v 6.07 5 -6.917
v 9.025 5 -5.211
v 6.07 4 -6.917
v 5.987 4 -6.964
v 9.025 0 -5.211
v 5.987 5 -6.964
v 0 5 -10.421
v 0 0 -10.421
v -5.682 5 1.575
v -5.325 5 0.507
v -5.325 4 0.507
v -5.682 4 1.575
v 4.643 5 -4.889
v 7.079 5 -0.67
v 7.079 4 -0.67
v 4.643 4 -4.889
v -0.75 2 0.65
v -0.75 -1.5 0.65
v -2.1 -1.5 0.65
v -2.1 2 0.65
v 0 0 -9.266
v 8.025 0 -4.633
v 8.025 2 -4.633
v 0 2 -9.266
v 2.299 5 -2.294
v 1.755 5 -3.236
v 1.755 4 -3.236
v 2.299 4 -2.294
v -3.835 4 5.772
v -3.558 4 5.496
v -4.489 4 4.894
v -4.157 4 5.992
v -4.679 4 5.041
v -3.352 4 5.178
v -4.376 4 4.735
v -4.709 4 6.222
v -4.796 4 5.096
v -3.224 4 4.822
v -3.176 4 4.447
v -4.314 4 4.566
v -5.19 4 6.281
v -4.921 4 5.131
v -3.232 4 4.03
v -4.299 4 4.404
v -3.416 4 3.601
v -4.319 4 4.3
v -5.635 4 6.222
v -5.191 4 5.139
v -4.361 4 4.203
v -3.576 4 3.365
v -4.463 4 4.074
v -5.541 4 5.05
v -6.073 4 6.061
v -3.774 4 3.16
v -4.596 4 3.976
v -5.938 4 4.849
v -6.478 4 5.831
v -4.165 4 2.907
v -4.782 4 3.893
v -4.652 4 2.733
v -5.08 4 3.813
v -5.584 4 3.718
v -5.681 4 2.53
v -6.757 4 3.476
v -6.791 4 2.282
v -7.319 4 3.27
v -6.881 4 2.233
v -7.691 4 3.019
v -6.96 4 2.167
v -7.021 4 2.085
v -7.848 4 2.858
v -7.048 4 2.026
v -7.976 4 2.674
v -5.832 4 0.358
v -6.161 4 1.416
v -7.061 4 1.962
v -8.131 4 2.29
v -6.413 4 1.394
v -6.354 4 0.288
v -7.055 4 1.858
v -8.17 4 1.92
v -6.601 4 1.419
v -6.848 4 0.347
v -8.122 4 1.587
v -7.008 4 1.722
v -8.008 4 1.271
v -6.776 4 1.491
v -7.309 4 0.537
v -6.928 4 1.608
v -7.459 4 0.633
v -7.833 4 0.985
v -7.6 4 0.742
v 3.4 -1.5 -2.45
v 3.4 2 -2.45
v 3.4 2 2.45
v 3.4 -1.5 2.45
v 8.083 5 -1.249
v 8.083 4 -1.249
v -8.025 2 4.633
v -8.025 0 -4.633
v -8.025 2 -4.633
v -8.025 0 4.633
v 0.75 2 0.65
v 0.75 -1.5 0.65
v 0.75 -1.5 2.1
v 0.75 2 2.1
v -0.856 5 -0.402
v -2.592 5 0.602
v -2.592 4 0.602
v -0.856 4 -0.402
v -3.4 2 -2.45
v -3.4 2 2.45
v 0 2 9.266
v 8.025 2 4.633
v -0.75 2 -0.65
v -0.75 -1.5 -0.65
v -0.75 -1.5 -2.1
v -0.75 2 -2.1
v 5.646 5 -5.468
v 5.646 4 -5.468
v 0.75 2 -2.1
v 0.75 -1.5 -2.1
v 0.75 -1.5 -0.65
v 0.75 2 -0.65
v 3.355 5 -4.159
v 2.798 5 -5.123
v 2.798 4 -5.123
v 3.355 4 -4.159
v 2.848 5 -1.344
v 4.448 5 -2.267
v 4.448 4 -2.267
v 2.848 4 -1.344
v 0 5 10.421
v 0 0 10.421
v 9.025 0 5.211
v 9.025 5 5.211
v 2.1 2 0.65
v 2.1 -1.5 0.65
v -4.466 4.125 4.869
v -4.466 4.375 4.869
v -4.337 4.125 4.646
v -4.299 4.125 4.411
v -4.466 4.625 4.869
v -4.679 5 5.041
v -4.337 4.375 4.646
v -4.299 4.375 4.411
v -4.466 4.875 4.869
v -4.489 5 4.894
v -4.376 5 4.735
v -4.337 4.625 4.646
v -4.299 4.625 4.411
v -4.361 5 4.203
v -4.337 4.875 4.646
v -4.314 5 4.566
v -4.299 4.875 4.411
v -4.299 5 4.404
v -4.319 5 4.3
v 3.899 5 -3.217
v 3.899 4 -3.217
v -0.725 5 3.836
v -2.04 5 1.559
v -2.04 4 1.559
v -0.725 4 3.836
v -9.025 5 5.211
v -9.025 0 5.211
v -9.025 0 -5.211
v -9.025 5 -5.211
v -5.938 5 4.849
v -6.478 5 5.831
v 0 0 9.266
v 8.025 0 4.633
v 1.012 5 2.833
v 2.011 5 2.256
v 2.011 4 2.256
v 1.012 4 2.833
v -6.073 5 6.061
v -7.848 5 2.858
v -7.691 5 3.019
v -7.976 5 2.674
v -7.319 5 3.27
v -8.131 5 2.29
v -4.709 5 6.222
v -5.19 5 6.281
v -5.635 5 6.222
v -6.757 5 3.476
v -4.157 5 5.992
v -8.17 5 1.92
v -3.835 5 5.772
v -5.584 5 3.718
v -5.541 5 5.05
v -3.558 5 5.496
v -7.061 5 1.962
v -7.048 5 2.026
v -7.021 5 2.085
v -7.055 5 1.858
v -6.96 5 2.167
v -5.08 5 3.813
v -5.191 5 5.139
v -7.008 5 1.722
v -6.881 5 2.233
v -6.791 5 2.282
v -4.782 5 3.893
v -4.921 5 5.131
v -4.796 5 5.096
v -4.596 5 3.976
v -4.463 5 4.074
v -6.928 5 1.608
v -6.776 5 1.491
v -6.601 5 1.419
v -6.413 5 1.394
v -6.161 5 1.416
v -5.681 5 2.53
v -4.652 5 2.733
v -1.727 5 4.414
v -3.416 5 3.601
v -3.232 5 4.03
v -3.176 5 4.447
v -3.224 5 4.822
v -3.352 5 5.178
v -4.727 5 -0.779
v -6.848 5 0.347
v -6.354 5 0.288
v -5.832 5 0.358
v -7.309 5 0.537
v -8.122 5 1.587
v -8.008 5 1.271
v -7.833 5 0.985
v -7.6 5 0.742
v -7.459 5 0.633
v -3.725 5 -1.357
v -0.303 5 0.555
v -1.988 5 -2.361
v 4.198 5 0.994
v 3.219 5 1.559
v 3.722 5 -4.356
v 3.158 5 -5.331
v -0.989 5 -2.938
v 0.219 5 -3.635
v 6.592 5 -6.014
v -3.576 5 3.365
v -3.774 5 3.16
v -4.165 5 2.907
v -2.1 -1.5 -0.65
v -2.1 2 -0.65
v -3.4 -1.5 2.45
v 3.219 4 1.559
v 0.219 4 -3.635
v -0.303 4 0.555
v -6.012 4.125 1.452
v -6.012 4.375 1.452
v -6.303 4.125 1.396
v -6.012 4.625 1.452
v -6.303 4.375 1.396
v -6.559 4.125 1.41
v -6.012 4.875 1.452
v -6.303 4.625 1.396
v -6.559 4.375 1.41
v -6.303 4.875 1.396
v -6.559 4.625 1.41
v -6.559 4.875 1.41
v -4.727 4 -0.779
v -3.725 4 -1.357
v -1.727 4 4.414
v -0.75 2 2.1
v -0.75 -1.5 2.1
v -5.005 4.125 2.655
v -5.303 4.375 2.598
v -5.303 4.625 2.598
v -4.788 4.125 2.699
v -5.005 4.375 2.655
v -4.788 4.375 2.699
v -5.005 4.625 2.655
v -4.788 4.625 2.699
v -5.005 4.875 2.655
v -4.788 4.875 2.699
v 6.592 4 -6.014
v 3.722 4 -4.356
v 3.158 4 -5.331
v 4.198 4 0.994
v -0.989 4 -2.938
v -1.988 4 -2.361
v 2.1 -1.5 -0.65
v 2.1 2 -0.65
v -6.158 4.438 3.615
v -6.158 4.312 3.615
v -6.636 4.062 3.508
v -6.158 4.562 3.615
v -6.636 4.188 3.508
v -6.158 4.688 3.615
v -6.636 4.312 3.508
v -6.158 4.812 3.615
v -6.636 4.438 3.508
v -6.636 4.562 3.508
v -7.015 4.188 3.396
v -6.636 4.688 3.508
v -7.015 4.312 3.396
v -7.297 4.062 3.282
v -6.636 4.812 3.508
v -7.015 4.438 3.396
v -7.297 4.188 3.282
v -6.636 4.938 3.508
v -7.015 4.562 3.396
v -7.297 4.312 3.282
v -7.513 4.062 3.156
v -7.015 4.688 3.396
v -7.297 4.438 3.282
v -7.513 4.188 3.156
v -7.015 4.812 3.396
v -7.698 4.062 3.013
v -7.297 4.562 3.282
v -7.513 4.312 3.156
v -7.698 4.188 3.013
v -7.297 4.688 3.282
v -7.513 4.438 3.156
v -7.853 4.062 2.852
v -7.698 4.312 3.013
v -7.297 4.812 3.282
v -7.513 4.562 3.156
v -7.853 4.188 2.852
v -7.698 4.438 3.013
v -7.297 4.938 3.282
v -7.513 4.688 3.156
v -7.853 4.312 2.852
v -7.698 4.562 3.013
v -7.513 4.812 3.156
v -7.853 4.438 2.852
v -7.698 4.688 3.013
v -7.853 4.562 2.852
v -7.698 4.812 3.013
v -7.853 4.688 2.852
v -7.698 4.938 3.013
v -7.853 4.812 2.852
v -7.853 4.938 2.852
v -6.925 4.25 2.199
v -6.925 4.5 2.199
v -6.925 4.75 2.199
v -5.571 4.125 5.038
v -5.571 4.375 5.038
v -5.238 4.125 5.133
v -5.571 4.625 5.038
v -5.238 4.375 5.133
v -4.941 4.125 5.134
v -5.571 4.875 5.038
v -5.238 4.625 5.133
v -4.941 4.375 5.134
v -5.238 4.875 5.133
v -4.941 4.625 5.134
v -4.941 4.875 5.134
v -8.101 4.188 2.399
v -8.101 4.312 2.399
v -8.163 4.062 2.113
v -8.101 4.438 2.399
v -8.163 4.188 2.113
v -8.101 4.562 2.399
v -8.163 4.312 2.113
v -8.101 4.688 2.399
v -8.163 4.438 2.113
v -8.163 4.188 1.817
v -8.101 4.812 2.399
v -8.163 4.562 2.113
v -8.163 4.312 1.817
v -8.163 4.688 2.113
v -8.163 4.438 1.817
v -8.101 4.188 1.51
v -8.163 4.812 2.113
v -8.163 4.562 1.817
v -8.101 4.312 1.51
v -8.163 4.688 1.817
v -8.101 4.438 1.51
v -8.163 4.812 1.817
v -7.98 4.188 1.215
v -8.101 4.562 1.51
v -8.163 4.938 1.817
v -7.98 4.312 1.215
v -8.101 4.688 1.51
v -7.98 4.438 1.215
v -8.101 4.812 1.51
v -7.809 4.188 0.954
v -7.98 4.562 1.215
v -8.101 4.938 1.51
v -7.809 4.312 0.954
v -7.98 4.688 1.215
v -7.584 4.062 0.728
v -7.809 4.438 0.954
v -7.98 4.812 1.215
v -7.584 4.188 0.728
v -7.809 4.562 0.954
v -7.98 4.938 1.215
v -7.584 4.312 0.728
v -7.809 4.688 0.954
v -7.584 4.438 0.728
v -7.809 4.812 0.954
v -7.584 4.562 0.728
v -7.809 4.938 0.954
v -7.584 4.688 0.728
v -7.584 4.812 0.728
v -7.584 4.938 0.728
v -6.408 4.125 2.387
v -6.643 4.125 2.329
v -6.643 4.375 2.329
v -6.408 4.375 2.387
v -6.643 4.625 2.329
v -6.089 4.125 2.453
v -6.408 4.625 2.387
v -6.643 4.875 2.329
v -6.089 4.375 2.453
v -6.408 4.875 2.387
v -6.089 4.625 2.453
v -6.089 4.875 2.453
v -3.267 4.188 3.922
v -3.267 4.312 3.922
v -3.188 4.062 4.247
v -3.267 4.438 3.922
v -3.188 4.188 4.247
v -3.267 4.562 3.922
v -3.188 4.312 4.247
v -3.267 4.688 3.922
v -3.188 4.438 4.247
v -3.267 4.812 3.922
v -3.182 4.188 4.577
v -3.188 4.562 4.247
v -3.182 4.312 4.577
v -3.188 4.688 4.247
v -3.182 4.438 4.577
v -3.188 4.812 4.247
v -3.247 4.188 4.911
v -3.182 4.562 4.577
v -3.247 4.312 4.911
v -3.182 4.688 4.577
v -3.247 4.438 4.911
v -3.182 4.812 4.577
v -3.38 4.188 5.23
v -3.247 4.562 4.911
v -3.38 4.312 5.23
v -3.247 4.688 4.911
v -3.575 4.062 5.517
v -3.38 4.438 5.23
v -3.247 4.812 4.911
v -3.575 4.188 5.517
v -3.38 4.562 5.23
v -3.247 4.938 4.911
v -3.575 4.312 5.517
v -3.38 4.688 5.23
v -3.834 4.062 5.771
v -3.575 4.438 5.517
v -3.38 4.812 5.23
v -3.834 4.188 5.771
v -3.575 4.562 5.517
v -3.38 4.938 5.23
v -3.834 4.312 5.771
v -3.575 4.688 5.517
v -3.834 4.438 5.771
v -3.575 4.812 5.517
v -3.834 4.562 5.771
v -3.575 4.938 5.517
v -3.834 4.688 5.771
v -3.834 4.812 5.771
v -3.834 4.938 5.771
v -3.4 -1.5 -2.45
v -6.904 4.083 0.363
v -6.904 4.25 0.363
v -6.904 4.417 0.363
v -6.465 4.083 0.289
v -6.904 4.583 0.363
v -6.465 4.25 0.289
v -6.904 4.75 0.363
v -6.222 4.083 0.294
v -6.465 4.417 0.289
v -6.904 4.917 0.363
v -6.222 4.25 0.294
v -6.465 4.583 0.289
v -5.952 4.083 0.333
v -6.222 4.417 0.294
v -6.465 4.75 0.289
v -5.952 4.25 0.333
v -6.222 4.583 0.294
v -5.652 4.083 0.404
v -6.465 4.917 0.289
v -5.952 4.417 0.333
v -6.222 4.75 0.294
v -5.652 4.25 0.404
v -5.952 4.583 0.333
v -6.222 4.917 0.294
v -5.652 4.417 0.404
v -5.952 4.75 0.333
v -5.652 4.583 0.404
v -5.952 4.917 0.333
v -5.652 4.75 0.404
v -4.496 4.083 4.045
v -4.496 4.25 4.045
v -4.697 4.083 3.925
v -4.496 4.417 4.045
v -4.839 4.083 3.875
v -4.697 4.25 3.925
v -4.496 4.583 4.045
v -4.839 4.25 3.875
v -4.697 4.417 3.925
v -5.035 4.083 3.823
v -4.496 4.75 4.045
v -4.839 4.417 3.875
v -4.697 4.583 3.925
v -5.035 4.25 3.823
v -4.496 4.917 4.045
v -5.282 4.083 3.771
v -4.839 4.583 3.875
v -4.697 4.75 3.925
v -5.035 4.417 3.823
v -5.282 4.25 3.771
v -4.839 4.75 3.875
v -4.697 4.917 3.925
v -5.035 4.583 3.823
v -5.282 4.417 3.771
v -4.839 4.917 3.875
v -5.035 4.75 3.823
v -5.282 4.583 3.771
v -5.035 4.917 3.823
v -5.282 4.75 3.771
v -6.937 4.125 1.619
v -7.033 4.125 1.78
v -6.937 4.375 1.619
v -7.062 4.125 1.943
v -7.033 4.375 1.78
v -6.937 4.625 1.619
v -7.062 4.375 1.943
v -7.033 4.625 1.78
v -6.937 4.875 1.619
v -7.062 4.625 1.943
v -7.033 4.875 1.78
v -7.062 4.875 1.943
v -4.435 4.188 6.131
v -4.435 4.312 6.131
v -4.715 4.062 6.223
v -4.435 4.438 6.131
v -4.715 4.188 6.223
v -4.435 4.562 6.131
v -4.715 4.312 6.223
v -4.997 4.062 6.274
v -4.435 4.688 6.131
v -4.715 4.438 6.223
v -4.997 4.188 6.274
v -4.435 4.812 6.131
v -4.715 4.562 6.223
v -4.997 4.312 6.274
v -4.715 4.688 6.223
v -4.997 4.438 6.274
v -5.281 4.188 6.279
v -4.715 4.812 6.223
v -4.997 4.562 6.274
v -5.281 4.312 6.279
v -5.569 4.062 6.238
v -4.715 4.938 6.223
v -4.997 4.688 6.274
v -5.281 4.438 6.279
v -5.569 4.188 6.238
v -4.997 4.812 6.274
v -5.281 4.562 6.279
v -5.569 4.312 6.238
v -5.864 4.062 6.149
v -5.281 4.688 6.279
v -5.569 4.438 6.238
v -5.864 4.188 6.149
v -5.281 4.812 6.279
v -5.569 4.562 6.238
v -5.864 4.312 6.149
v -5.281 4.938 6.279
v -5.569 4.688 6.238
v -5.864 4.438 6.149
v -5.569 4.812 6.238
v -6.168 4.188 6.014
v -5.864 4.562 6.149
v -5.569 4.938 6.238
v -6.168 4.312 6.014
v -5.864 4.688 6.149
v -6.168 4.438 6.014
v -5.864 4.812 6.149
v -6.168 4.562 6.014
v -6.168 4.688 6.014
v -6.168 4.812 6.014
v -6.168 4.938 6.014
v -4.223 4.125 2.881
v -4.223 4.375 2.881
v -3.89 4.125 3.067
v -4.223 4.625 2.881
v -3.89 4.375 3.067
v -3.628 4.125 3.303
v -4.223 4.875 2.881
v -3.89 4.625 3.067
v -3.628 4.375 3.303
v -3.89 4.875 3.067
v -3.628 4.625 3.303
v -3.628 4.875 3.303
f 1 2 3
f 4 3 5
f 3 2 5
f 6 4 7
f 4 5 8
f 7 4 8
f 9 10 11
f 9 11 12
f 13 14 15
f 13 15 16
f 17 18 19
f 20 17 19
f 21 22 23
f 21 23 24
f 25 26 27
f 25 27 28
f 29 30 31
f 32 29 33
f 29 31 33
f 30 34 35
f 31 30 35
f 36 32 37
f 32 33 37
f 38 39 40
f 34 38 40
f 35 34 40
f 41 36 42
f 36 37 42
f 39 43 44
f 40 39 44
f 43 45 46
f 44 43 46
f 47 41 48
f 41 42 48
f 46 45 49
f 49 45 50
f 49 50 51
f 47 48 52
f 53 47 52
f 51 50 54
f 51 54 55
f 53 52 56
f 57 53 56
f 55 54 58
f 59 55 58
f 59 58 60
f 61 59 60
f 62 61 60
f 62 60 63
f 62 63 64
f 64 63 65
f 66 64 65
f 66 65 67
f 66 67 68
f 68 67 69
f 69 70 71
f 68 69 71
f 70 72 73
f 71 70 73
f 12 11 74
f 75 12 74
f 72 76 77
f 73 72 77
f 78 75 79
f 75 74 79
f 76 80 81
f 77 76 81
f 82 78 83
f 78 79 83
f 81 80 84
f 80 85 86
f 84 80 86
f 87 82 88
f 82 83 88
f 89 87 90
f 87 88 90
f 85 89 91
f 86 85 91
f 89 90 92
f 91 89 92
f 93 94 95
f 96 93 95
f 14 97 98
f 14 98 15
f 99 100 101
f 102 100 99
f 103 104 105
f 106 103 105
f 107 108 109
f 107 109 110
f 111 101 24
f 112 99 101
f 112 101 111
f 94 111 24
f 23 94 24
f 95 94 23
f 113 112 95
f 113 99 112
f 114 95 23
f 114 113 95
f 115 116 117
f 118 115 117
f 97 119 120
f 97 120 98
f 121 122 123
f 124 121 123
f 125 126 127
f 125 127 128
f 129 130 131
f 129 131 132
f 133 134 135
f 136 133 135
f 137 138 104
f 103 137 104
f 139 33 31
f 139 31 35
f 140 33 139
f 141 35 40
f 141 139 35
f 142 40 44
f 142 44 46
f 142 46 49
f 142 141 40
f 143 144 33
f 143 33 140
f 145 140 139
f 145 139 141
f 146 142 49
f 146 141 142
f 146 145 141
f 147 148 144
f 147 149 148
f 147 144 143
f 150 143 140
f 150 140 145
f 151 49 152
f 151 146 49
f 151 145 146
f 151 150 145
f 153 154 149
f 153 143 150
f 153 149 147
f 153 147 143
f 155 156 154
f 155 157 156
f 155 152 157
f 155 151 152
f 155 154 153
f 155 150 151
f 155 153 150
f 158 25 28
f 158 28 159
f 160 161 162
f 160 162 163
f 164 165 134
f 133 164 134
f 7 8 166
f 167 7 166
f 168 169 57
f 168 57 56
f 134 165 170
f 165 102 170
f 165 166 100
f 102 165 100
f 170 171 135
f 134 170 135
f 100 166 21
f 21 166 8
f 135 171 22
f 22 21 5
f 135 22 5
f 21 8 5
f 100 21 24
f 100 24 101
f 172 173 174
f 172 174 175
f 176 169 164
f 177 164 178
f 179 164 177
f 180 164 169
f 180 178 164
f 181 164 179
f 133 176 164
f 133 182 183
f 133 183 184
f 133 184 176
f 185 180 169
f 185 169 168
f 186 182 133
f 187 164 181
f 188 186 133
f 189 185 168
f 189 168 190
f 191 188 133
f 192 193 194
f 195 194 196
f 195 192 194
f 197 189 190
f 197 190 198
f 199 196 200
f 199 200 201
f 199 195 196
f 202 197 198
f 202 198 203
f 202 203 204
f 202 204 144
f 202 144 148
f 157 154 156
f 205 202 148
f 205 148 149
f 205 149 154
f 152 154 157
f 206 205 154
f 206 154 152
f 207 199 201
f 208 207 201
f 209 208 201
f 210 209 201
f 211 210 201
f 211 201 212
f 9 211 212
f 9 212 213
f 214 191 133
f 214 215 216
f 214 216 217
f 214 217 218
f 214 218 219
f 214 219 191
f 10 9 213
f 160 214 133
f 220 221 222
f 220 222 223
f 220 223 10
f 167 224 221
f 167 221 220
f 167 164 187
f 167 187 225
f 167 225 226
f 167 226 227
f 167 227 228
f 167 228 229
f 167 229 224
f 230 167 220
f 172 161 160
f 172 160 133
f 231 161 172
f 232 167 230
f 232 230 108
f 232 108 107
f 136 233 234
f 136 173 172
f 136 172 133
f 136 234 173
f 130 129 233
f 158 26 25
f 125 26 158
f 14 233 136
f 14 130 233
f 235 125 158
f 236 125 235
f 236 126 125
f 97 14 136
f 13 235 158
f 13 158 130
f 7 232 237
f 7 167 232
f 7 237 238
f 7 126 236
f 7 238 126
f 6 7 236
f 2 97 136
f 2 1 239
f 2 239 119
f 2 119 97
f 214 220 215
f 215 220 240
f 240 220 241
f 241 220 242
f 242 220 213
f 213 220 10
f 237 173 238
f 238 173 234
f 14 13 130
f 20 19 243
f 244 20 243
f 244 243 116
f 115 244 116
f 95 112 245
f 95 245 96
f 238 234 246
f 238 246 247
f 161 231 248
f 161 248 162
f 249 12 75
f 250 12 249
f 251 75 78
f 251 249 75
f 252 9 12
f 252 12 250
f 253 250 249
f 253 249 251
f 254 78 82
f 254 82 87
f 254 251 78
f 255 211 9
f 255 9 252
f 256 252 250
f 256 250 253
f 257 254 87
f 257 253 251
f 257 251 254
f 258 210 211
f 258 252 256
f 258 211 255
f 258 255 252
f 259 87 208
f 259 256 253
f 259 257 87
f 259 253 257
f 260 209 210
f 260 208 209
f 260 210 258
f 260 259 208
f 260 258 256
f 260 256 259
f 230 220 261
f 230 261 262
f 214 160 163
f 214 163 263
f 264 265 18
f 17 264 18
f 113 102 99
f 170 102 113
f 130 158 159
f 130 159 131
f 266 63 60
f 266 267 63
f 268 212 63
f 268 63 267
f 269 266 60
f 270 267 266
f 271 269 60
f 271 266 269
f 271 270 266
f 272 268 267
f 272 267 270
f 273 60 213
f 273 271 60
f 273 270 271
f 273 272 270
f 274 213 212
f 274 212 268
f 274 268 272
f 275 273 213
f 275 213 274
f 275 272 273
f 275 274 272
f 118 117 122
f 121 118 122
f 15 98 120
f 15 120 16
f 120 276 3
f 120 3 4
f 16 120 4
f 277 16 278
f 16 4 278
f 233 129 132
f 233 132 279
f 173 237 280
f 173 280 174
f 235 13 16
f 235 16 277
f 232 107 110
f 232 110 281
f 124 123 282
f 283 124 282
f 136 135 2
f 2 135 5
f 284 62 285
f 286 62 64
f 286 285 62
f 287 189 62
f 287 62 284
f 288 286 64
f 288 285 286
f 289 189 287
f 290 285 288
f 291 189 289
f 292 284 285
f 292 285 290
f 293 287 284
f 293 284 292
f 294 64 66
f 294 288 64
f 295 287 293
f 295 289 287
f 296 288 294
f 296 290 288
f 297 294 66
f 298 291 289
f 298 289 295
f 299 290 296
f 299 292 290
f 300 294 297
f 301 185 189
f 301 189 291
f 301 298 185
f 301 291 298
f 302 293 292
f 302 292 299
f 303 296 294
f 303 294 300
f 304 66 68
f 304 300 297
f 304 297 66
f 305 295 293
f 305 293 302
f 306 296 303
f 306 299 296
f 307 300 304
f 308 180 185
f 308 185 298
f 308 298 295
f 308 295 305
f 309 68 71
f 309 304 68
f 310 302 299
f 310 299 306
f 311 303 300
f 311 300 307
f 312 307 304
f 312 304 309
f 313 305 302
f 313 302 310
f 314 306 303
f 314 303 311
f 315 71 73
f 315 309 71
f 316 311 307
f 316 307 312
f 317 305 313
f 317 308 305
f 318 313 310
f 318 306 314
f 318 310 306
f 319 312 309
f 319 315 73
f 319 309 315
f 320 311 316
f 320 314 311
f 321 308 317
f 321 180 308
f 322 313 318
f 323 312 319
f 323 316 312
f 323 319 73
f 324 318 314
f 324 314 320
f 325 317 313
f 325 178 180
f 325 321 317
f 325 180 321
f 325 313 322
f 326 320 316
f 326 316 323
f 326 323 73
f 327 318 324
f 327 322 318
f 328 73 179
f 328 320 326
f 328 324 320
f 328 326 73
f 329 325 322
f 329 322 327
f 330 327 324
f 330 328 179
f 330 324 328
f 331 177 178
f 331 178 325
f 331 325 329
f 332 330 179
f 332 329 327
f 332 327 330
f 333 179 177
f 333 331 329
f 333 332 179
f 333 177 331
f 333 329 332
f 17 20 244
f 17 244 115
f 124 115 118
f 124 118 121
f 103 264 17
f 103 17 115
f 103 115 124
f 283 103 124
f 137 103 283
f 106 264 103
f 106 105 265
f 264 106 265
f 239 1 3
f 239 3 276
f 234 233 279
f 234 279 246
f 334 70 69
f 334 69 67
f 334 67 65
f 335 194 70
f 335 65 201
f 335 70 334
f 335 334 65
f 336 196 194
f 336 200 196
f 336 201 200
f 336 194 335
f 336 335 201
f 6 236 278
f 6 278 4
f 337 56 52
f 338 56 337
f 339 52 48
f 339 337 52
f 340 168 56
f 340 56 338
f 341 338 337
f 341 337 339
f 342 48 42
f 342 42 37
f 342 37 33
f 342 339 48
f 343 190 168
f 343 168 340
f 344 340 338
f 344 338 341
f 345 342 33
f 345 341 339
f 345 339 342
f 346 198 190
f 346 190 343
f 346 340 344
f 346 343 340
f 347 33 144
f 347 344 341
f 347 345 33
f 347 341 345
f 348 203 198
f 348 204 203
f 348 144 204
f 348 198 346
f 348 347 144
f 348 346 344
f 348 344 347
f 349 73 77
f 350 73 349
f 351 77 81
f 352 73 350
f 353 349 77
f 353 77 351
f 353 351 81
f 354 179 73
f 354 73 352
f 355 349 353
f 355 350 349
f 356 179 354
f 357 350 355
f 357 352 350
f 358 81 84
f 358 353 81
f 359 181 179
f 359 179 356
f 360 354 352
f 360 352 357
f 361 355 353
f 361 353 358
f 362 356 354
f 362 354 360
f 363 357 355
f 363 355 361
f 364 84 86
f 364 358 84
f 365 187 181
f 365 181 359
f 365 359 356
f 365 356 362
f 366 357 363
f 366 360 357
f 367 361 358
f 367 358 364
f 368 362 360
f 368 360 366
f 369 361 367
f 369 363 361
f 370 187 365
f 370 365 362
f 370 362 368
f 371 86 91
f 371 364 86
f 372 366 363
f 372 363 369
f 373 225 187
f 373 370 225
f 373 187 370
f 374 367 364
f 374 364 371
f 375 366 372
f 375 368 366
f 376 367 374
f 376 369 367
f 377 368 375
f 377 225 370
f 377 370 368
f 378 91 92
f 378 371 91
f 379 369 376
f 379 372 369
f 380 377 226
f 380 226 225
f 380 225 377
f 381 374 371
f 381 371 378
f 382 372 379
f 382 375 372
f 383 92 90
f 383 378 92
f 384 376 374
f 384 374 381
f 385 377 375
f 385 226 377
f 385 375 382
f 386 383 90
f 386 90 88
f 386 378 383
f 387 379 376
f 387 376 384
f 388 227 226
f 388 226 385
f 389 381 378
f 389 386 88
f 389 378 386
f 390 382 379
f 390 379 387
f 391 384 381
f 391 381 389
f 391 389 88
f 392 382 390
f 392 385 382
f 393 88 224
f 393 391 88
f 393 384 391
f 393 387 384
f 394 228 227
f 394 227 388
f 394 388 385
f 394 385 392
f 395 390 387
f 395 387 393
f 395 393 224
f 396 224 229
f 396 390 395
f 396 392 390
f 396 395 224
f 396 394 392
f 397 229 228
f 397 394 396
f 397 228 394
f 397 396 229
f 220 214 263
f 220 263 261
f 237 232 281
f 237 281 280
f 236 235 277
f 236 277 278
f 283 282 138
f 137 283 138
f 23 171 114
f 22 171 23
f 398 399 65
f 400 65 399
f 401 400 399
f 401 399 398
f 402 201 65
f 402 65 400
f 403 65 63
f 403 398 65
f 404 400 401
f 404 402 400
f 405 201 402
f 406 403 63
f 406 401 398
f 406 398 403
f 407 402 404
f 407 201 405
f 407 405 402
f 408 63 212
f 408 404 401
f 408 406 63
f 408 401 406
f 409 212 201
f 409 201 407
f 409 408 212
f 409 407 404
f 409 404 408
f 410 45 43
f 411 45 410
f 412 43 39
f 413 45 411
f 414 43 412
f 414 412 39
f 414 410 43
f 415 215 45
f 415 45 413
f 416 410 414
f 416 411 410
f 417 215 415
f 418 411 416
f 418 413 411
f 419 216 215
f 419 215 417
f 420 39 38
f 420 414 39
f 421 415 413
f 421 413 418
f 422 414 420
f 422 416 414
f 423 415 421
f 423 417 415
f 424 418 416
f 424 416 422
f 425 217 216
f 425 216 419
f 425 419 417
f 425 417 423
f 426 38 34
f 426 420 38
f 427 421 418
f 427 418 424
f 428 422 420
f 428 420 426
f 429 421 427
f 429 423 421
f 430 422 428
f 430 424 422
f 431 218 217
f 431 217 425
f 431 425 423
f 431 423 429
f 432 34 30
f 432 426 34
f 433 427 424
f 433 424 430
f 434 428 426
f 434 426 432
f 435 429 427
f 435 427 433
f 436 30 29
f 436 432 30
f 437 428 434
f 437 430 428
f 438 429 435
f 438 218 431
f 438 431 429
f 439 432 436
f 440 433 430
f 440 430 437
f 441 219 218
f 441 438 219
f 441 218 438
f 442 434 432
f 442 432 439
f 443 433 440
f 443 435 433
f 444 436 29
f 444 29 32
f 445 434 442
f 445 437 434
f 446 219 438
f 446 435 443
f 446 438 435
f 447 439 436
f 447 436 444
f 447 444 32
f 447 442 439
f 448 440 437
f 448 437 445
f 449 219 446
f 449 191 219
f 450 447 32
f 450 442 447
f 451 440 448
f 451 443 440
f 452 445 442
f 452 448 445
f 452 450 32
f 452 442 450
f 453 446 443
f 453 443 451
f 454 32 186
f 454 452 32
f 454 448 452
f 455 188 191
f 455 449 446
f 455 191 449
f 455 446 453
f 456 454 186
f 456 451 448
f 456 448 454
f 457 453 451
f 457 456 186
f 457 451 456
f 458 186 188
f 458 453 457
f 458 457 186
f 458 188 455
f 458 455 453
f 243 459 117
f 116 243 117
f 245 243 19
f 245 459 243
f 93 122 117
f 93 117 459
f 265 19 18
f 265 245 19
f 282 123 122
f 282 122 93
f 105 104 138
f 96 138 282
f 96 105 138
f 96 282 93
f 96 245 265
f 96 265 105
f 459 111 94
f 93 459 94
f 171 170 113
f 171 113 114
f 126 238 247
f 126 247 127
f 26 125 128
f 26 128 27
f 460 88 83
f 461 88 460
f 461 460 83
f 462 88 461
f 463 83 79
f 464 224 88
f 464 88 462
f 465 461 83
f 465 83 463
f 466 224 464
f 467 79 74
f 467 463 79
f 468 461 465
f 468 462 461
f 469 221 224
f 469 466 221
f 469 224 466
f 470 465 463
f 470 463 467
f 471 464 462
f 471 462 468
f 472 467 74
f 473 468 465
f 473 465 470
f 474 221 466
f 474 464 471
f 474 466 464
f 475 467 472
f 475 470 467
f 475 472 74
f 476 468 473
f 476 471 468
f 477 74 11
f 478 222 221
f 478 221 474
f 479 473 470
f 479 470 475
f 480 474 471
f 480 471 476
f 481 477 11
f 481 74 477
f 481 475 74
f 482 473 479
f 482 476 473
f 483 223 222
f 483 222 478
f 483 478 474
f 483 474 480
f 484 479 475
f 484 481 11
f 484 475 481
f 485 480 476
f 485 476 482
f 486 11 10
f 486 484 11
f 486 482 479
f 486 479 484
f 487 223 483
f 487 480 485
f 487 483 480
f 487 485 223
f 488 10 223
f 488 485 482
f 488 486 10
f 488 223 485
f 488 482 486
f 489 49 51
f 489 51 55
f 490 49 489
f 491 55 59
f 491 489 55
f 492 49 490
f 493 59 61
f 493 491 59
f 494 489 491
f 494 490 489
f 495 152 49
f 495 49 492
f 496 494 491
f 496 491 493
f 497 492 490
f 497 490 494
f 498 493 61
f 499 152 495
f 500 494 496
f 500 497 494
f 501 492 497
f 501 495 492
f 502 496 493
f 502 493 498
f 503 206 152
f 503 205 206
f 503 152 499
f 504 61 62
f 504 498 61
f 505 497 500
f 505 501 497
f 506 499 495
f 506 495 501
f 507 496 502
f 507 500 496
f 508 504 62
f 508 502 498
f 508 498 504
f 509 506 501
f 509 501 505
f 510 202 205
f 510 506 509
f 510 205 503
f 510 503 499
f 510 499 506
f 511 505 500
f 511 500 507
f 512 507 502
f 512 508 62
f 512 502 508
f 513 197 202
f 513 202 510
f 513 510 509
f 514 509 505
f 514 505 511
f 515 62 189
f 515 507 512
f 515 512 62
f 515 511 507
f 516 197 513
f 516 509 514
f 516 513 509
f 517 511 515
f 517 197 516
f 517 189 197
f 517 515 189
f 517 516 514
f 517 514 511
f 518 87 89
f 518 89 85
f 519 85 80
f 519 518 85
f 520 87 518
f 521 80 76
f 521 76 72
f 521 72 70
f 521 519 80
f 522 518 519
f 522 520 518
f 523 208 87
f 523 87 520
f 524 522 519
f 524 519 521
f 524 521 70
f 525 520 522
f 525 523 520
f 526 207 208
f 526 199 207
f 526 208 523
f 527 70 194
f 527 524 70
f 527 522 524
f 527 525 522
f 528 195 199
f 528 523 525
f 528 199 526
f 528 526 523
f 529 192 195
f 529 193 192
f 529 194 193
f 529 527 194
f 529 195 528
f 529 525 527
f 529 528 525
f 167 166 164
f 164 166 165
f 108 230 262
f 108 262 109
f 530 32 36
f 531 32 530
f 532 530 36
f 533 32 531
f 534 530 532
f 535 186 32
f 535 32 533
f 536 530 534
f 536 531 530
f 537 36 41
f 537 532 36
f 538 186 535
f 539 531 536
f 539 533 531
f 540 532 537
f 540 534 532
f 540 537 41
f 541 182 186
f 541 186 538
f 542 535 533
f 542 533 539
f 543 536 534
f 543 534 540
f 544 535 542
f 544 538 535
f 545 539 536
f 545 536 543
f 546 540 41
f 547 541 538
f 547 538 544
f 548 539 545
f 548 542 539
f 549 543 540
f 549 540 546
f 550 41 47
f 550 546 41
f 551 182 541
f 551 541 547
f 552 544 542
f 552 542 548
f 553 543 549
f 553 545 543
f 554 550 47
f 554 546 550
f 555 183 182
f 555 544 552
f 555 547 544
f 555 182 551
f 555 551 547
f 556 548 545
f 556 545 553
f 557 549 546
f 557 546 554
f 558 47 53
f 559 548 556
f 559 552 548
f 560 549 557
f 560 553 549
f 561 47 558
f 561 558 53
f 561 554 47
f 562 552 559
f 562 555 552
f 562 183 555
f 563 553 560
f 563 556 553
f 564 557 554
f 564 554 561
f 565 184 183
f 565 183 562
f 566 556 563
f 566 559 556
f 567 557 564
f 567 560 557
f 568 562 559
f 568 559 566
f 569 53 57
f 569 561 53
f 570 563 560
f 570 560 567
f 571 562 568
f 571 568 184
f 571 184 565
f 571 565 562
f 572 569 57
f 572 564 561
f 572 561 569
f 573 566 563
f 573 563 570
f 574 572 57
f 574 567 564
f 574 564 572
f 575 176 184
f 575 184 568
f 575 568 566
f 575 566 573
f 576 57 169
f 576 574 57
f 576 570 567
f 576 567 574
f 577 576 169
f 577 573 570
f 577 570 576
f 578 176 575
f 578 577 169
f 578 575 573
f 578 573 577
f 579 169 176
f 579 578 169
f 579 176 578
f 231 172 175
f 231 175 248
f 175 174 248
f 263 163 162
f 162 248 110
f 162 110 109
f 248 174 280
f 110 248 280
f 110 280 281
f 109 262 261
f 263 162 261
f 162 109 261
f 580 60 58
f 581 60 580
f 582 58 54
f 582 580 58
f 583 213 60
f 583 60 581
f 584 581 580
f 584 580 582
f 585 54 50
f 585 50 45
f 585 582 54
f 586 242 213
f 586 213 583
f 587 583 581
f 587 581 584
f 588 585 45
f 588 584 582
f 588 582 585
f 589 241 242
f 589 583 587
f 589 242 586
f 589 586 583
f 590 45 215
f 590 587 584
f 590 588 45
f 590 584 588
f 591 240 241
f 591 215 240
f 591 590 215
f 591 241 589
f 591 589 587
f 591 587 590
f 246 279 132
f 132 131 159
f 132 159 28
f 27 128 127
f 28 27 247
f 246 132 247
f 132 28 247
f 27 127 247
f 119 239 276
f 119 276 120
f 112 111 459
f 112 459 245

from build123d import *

# Parameters (mm, degrees)
BOSS_EXTRUDE1_DEPTH = 5
SHELL1_T            = -1
BOSS_EXTRUDE2_DEPTH = 2
SKETCH3_W           = 6.8
SKETCH3_H           = 4.9
BOSS_EXTRUDE3_DEPTH = 3.5
CUT_EXTRUDE1_DEPTH  = 3.5
CUT_EXTRUDE2_DEPTH  = 1


with BuildPart() as part:
    # Sketch1 → Boss-Extrude1 (new body)
    with BuildSketch(Plane(origin=(0, 0, 0), x_dir=(1, 0, 0), z_dir=(0, 1, 0))):
        Polygon((9.025, 5.210586179), (0, 10.421172359), (-9.025, 5.210586179), (-9.025, -5.210586179), (0, -10.421172359), (9.025, -5.210586179), align=None)
    extrude(amount=BOSS_EXTRUDE1_DEPTH)

    # Shell1
    shell1_openings = [part.faces().sort_by_distance(p)[0] for p in [
        (0, 0, 0),
    ]]
    offset(amount=SHELL1_T, openings=shell1_openings, kind=Kind.INTERSECTION)

    # Sketch2 → Boss-Extrude2 (add)
    with BuildSketch(Plane.XZ.offset(-4)):
        Polygon((8.025, -4.63323591), (8.025, 4.63323591), (0, 9.26647182), (-8.025, 4.63323591), (-8.025, -4.63323591), (0, -9.26647182), align=None)
    extrude(amount=BOSS_EXTRUDE2_DEPTH)

    # Sketch3 → Boss-Extrude3 (add)
    with BuildSketch(Plane.XZ.offset(-2)):
        Rectangle(SKETCH3_W, SKETCH3_H)
    extrude(amount=BOSS_EXTRUDE3_DEPTH)

    # Sketch4 → Cut-Extrude1 (cut)
    with BuildSketch(Plane.XZ.offset(1.5)):
        Polygon((2.1, -0.65), (2.1, 0.65), (0.75, 0.65), (0.75, 2.1), (-0.75, 2.1), (-0.75, 0.65), (-2.1, 0.65), (-2.1, -0.65), (-0.75, -0.65), (-0.75, -2.1), (0.75, -2.1), (0.75, -0.65), align=None)
    extrude(amount=-CUT_EXTRUDE1_DEPTH, mode=Mode.SUBTRACT)

    # Sketch5 → Cut-Extrude2 (cut)
    with BuildSketch(Plane(origin=(0, 5, 0), x_dir=(1, 0, 0), z_dir=(0, 1, 0))):
        with BuildLine():
            Line((-5.325433461, -0.506892934), (-5.682404615, -1.575402549))
            add(Edge.make_bspline(
                [(-5.682404615, -1.575402549), (-5.738611571, -1.55146657), (-5.846580721, -1.505487433), (-6.00645553, -1.450457601), (-6.157396888, -1.414148084), (-6.299119737, -1.39335946), (-6.432402529, -1.39262203), (-6.556831326, -1.405715783), (-6.672502146, -1.438161724), (-6.741797161, -1.473664937), (-6.776154615, -1.491267934)],
                knots=[0, 0, 0, 0, 1.28771263, 2.473594846, 3.559332536, 4.55671893, 5.485823958, 6.361652317, 7.187683927, 8, 8, 8, 8], degree=3))
            add(Edge.make_bspline(
                [(-6.776154615, -1.491267934), (-6.806492545, -1.510352721), (-6.864710582, -1.546976143), (-6.938739485, -1.61588131), (-6.99599337, -1.693290765), (-7.035307029, -1.777376197), (-7.058013134, -1.861350567), (-7.065305532, -1.942177188), (-7.054051685, -2.018272363), (-7.032137808, -2.062995336), (-7.021346922, -2.085017934)],
                knots=[0, 0, 0, 0, 1.209748172, 2.321488709, 3.39707423, 4.445359682, 5.44094777, 6.3240213, 7.174710374, 8, 8, 8, 8], degree=3))
            add(Edge.make_bspline(
                [(-7.021346922, -2.085017934), (-7.007656472, -2.106037373), (-6.980319555, -2.148008721), (-6.925567054, -2.201021253), (-6.862951825, -2.247786346), (-6.815080973, -2.270504668), (-6.790577692, -2.282133319)],
                knots=[0, 0, 0, 0, 0.973157049, 1.943187581, 2.947195419, 4, 4, 4, 4], degree=3))
            add(Edge.make_bspline(
                [(-6.790577692, -2.282133319), (-6.769858792, -2.290097745), (-6.7215347, -2.308673716), (-6.63598808, -2.33053668), (-6.529832527, -2.359308535), (-6.401725396, -2.388293787), (-6.252497256, -2.421379678), (-6.081066664, -2.454151642), (-5.88849741, -2.491724711), (-5.752544005, -2.516649981), (-5.681202692, -2.529729472)],
                knots=[0, 0, 0, 0, 0.467887767, 1.091286356, 1.859988272, 2.788638217, 3.861161716, 5.084362453, 6.470024239, 8, 8, 8, 8], degree=3))
            add(Edge.make_bspline(
                [(-5.681202692, -2.529729472), (-5.614688545, -2.541707449), (-5.488466865, -2.564437657), (-5.309075132, -2.597398063), (-5.149619325, -2.624932828), (-5.010942301, -2.653591474), (-4.892650506, -2.677133355), (-4.794430155, -2.697661701), (-4.716489125, -2.714957182), (-4.671549695, -2.727498295), (-4.652356538, -2.732854472)],
                knots=[0, 0, 0, 0, 1.546287761, 2.93433875, 4.173173077, 5.24819644, 6.174012619, 6.932675225, 7.544156831, 8, 8, 8, 8], degree=3))
            add(Edge.make_bspline(
                [(-4.652356538, -2.732854472), (-4.576623584, -2.754433542), (-4.430948197, -2.795941753), (-4.228232443, -2.875630456), (-4.047908963, -2.962859498), (-3.890344122, -3.062664527), (-3.751179655, -3.17552418), (-3.624703925, -3.301019132), (-3.512720637, -3.444029872), (-3.448277986, -3.547923786), (-3.415577692, -3.600642934)],
                knots=[0, 0, 0, 0, 1.214203853, 2.335570051, 3.355534606, 4.300291848, 5.205716251, 6.114761862, 7.043368914, 8, 8, 8, 8], degree=3))
            add(Edge.make_bspline(
                [(-3.415577692, -3.600642934), (-3.386940184, -3.653439855), (-3.330617955, -3.757277112), (-3.264417801, -3.919102949), (-3.215768933, -4.082115905), (-3.185465465, -4.246531266), (-3.173372547, -4.41177459), (-3.179504364, -4.578223869), (-3.204041341, -4.745238515), (-3.244721037, -4.911960498), (-3.30204991, -5.075343685), (-3.377031051, -5.231803254), (-3.467113417, -5.380417938), (-3.574802899, -5.519417001), (-3.695616106, -5.652007924), (-3.834104159, -5.775095202), (-3.988505341, -5.889617335), (-4.100107682, -5.957675309), (-4.15716423, -5.992469857)],
                knots=[0, 0, 0, 0, 1.025678726, 2.017232489, 2.981083202, 3.927665712, 4.867989921, 5.806443481, 6.767762737, 7.747334686, 8.73460219, 9.720539785, 10.706714995, 11.69798516, 12.720254519, 13.76740984, 14.858591258, 16, 16, 16, 16], degree=3))
            add(Edge.make_bspline(
                [(-4.15716423, -5.992469857), (-4.2029151, -6.017928425), (-4.293326345, -6.068238741), (-4.43299698, -6.132088815), (-4.573498408, -6.183443266), (-4.714079103, -6.224567518), (-4.854784589, -6.256505215), (-4.996764563, -6.275817947), (-5.139055192, -6.282263566), (-5.281711595, -6.280685803), (-5.425609337, -6.265765459), (-5.571059365, -6.239249342), (-5.718130016, -6.200666559), (-5.86656675, -6.149043701), (-6.01792839, -6.088380432), (-6.170664985, -6.014503942), (-6.325132479, -5.928971262), (-6.426330514, -5.864420115), (-6.478077692, -5.831412165)],
                knots=[0, 0, 0, 0, 1.017774509, 2.011289818, 2.982347635, 3.9240255, 4.857710421, 5.785363618, 6.705792502, 7.625165849, 8.556898814, 9.514964358, 10.497515854, 11.510029584, 12.568949849, 13.666508622, 14.80677927, 16, 16, 16, 16], degree=3))
            Line((-6.478077692, -5.831412165), (-5.93841423, -4.849441011))
            add(Edge.make_bspline(
                [(-5.93841423, -4.849441011), (-5.876066943, -4.885737418), (-5.756838552, -4.955148012), (-5.576733209, -5.038518479), (-5.405875784, -5.100678252), (-5.242445562, -5.135796737), (-5.0879048, -5.149004574), (-4.941778751, -5.138495445), (-4.803236577, -5.10468289), (-4.720183882, -5.061876928), (-4.678798845, -5.04054678)],
                knots=[0, 0, 0, 0, 1.293579815, 2.47374744, 3.555769028, 4.54819344, 5.46380976, 6.3287118, 7.167199521, 8, 8, 8, 8], degree=3))
            add(Edge.make_bspline(
                [(-4.678798845, -5.04054678), (-4.638936237, -5.015446967), (-4.561347561, -4.966592631), (-4.464150913, -4.872487164), (-4.387701145, -4.765879064), (-4.334443541, -4.648855696), (-4.303317377, -4.529157536), (-4.294197846, -4.412572162), (-4.313533945, -4.301642045), (-4.345449099, -4.235867679), (-4.361491153, -4.202806396)],
                knots=[0, 0, 0, 0, 1.138617944, 2.216208663, 3.252996335, 4.299549031, 5.311698101, 6.23549815, 7.113078549, 8, 8, 8, 8], degree=3))
            add(Edge.make_bspline(
                [(-4.361491153, -4.202806396), (-4.380010417, -4.173871492), (-4.4175359, -4.115240856), (-4.4965852, -4.041680531), (-4.589626245, -3.976678965), (-4.680359291, -3.930555918), (-4.765056268, -3.897993387), (-4.843056545, -3.872966048), (-4.933757848, -3.846171338), (-5.038856401, -3.822065238), (-5.155920712, -3.794858002), (-5.286890039, -3.77045363), (-5.430568678, -3.743553698), (-5.531326246, -3.727039534), (-5.583846922, -3.718431396)],
                knots=[0, 0, 0, 0, 0.909424095, 1.84276103, 2.843738267, 3.919499091, 4.536166438, 5.253068241, 6.095165878, 7.047724124, 8.116724405, 9.287726519, 10.586206066, 12, 12, 12, 12], degree=3))
            add(Edge.make_bspline(
                [(-5.583846922, -3.718431396), (-5.683655771, -3.701485292), (-5.875498665, -3.668913133), (-6.150918918, -3.617525985), (-6.401889951, -3.56506577), (-6.628381182, -3.511091226), (-6.830571857, -3.456261035), (-7.008205883, -3.400069991), (-7.161834982, -3.344104119), (-7.293538663, -3.286043885), (-7.407482868, -3.222236129), (-7.512689732, -3.158161164), (-7.608810661, -3.087752964), (-7.698405428, -3.014463112), (-7.780415921, -2.936493879), (-7.853571897, -2.853349852), (-7.919489932, -2.766364229), (-7.956953592, -2.704748877), (-7.975673845, -2.673960242)],
                knots=[0, 0, 0, 0, 1.801703634, 3.463060095, 4.985942132, 6.364289375, 7.606258193, 8.713464438, 9.679023598, 10.515207159, 11.27148115, 12.001589174, 12.706147237, 13.389942357, 14.060675862, 14.717353214, 15.359072975, 16, 16, 16, 16], degree=3))
            add(Edge.make_bspline(
                [(-7.975673845, -2.673960242), (-7.999795613, -2.629122769), (-8.047616039, -2.540234299), (-8.103161683, -2.400567973), (-8.141164791, -2.257609045), (-8.166399838, -2.112801598), (-8.172416775, -1.965223955), (-8.166195079, -1.81528572), (-8.140455592, -1.663084625), (-8.103487814, -1.509287165), (-8.048666477, -1.358978393), (-7.983473223, -1.214192623), (-7.903174289, -1.078774796), (-7.810666895, -0.951928095), (-7.703446581, -0.834805086), (-7.584683375, -0.725513924), (-7.452816447, -0.6246676), (-7.357251696, -0.566533109), (-7.308606538, -0.536941011)],
                knots=[0, 0, 0, 0, 0.980347626, 1.943499407, 2.887156219, 3.826129841, 4.768902428, 5.727093312, 6.711776165, 7.737615518, 8.770284615, 9.789131514, 10.792512546, 11.797495335, 12.808358981, 13.846235693, 14.903673103, 16, 16, 16, 16], degree=3))
            add(Edge.make_bspline(
                [(-7.308606538, -0.536941011), (-7.243289176, -0.501983178), (-7.113314521, -0.43242078), (-6.904353926, -0.35846878), (-6.687820942, -0.308992515), (-6.500600952, -0.28813955), (-6.344609626, -0.287208489), (-6.219649665, -0.29249956), (-6.087866756, -0.309558499), (-5.948942979, -0.331728905), (-5.802667888, -0.363649134), (-5.649701479, -0.403532254), (-5.488917483, -0.449902409), (-5.38095366, -0.487538594), (-5.325433461, -0.506892934)],
                knots=[0, 0, 0, 0, 1.296925376, 2.580744562, 3.870196999, 5.183781057, 5.871953614, 6.603064647, 7.373865503, 8.19924855, 9.068280055, 9.996460477, 10.96968344, 12, 12, 12, 12], degree=3))
        make_face()
        Polygon((-4.727074029, 0.779164758), (-3.724670183, 1.357289758), (-2.592458644, -0.601844857), (-0.855679798, 0.401760912), (-1.987891337, 2.360895528), (-0.98909326, 2.937818604), (2.01090674, -2.255691011), (1.012108663, -2.832614088), (-0.302795183, -0.554969857), (-2.039574029, -1.558575626), (-0.724670183, -3.836219857), (-1.727074029, -4.414344857), align=None)
        Polygon((0.219435962, 3.634933989), (2.797560962, 5.122914758), (3.355253269, 4.158972451), (1.755493654, 3.235895528), (2.298762885, 2.293587835), (3.8985225, 3.216664758), (4.447801346, 2.267145528), (2.848041731, 1.344068604), (4.197801346, -0.99367178), (3.219435962, -1.558575626), align=None)
        Polygon((3.158297192, 5.330847451), (6.0284895, 6.988299374), (6.592191423, 6.013539758), (5.646277961, 5.467866681), (8.082576038, 1.249116681), (7.078970269, 0.669789758), (4.642672192, 4.888539758), (3.721999115, 4.356087835), align=None)
    extrude(amount=-CUT_EXTRUDE2_DEPTH, mode=Mode.SUBTRACT)


solid = part.part
